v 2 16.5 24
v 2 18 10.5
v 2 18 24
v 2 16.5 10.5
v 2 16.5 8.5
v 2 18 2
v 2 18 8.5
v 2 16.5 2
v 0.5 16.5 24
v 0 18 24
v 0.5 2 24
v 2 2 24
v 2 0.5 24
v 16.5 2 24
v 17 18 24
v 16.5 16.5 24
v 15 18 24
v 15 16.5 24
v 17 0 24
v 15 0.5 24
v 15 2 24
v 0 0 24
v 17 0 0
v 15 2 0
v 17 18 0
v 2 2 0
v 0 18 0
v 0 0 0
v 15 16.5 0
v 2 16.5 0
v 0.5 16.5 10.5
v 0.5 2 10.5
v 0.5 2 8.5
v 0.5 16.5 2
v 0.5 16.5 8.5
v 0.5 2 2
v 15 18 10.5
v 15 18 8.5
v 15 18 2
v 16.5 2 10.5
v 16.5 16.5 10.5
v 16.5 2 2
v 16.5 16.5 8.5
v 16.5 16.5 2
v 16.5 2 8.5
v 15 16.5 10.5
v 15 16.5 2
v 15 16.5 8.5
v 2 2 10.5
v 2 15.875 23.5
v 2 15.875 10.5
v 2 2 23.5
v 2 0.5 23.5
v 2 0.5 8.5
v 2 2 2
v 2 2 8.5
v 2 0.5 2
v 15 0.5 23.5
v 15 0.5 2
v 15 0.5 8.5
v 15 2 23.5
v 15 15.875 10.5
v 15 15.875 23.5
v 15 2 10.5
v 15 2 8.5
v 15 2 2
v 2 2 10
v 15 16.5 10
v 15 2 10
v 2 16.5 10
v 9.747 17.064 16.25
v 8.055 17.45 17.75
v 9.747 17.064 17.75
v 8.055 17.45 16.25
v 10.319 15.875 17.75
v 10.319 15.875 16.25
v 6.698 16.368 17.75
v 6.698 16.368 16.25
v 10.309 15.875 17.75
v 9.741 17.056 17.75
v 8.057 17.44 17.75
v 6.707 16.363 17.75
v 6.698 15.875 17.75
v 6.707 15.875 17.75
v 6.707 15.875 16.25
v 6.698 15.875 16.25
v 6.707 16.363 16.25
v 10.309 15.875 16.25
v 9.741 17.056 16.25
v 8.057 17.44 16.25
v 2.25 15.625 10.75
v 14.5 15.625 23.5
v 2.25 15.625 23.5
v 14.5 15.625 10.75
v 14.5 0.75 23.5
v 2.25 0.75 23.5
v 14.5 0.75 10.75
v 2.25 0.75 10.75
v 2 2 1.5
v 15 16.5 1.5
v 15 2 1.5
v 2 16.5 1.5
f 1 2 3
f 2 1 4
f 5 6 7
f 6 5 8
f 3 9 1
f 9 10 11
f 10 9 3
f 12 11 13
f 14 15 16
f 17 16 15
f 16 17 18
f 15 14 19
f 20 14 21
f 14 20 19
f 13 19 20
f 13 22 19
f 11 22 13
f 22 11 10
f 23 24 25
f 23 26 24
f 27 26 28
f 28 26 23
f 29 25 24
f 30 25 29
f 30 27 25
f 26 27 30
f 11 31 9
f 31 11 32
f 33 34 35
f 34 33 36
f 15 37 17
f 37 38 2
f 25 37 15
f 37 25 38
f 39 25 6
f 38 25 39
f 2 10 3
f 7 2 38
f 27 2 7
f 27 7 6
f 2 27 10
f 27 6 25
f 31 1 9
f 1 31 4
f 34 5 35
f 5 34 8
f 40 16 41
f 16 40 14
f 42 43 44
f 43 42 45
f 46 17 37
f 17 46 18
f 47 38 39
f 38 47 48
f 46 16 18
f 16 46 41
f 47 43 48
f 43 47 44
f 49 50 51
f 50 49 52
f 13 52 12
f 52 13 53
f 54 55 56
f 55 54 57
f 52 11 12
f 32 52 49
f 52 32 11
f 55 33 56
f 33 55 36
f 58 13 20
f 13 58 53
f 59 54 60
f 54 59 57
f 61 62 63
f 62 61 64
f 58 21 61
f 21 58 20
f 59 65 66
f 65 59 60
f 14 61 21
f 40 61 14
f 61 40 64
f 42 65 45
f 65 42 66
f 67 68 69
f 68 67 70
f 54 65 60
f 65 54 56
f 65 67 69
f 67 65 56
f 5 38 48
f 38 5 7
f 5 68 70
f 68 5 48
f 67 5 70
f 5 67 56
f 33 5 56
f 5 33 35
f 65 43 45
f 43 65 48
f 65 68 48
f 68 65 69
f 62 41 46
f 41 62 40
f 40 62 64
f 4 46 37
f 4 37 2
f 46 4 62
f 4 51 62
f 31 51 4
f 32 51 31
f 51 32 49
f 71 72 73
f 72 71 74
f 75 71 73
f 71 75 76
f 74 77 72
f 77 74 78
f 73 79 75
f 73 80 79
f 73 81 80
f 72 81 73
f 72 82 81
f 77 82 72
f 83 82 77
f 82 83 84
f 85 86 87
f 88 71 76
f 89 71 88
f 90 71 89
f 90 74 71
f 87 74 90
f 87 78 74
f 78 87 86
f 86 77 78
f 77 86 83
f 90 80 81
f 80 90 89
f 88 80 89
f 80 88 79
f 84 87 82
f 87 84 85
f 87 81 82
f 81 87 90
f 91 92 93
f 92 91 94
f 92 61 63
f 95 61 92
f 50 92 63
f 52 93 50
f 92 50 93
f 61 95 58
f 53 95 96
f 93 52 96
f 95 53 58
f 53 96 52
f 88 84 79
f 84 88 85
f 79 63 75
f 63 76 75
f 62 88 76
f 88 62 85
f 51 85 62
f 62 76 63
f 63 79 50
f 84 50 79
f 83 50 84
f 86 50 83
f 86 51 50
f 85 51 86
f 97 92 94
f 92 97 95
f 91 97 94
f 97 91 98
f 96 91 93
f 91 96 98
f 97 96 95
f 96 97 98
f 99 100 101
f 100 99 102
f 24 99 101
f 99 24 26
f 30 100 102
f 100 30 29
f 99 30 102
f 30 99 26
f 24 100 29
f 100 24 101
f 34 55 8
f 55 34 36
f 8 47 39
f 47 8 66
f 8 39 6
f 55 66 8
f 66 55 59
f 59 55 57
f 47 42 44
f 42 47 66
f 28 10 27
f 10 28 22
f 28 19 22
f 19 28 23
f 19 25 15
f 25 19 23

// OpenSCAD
// FRAME 2x2's
color("purple"){
    translate([.5,.5,0]) cube([1.5,1.5,24]);
    translate([15,.5,0]) cube([1.5,1.5,24]);
    translate([0,16,0]){
        translate([.5,.5,0]) cube([1.5,1.5,24]);
        translate([15,.5,0]) cube([1.5,1.5,24]);
    }
}
translate([2,.5,0]) cube([13,1.5,1.5]);
translate([2,16.5,0]) cube([13,1.5,1.5]);
translate([.5,2,0]) cube([1.5,14.5,1.5]);
translate([15,2,0]) cube([1.5,14.5,1.5]);
translate([.5,.5,1.5]) color("red") cube([16,17.5,.5]);
// SHELF
translate([0,0,8.5]){
    translate([2,.5,0]) cube([13,1.5,1.5]);
    translate([2,16.5,0]) cube([13,1.5,1.5]);
    translate([.5,2,0]) cube([1.5,14.5,1.5]);
    translate([15,2,0]) cube([1.5,14.5,1.5]);
    translate([.5,.5,1.5]) color("red") cube([16,17.5,.5]);
}
// OUTSIDE 1/2" MDF
color("lightblue") cube([.5,18,24]);
color("white") translate([.5,0,0]) cube([16,.5,24]);
color("pink") translate([16.5,0,0]) cube([.5,18,24]);
// RECORD BOX KEEP
color("orange"){
        translate([2,.5,10.5]){
            translate([6.5,15,6.5]){
                difference(){
                    cylinder(1.5,2,2,true);
                    cylinder(2,1.99,1.99,true);
                    translate([-6.5,-15,-6.5]){
                        translate([.25,.25,.25]) cube([12.25,14.875,20]);
                }
                }
            }
            difference(){
                cube([13,15.375,13]);
                translate([.25,.25,.25]) cube([12.25,14.875,20]);
            }
        }
    }
